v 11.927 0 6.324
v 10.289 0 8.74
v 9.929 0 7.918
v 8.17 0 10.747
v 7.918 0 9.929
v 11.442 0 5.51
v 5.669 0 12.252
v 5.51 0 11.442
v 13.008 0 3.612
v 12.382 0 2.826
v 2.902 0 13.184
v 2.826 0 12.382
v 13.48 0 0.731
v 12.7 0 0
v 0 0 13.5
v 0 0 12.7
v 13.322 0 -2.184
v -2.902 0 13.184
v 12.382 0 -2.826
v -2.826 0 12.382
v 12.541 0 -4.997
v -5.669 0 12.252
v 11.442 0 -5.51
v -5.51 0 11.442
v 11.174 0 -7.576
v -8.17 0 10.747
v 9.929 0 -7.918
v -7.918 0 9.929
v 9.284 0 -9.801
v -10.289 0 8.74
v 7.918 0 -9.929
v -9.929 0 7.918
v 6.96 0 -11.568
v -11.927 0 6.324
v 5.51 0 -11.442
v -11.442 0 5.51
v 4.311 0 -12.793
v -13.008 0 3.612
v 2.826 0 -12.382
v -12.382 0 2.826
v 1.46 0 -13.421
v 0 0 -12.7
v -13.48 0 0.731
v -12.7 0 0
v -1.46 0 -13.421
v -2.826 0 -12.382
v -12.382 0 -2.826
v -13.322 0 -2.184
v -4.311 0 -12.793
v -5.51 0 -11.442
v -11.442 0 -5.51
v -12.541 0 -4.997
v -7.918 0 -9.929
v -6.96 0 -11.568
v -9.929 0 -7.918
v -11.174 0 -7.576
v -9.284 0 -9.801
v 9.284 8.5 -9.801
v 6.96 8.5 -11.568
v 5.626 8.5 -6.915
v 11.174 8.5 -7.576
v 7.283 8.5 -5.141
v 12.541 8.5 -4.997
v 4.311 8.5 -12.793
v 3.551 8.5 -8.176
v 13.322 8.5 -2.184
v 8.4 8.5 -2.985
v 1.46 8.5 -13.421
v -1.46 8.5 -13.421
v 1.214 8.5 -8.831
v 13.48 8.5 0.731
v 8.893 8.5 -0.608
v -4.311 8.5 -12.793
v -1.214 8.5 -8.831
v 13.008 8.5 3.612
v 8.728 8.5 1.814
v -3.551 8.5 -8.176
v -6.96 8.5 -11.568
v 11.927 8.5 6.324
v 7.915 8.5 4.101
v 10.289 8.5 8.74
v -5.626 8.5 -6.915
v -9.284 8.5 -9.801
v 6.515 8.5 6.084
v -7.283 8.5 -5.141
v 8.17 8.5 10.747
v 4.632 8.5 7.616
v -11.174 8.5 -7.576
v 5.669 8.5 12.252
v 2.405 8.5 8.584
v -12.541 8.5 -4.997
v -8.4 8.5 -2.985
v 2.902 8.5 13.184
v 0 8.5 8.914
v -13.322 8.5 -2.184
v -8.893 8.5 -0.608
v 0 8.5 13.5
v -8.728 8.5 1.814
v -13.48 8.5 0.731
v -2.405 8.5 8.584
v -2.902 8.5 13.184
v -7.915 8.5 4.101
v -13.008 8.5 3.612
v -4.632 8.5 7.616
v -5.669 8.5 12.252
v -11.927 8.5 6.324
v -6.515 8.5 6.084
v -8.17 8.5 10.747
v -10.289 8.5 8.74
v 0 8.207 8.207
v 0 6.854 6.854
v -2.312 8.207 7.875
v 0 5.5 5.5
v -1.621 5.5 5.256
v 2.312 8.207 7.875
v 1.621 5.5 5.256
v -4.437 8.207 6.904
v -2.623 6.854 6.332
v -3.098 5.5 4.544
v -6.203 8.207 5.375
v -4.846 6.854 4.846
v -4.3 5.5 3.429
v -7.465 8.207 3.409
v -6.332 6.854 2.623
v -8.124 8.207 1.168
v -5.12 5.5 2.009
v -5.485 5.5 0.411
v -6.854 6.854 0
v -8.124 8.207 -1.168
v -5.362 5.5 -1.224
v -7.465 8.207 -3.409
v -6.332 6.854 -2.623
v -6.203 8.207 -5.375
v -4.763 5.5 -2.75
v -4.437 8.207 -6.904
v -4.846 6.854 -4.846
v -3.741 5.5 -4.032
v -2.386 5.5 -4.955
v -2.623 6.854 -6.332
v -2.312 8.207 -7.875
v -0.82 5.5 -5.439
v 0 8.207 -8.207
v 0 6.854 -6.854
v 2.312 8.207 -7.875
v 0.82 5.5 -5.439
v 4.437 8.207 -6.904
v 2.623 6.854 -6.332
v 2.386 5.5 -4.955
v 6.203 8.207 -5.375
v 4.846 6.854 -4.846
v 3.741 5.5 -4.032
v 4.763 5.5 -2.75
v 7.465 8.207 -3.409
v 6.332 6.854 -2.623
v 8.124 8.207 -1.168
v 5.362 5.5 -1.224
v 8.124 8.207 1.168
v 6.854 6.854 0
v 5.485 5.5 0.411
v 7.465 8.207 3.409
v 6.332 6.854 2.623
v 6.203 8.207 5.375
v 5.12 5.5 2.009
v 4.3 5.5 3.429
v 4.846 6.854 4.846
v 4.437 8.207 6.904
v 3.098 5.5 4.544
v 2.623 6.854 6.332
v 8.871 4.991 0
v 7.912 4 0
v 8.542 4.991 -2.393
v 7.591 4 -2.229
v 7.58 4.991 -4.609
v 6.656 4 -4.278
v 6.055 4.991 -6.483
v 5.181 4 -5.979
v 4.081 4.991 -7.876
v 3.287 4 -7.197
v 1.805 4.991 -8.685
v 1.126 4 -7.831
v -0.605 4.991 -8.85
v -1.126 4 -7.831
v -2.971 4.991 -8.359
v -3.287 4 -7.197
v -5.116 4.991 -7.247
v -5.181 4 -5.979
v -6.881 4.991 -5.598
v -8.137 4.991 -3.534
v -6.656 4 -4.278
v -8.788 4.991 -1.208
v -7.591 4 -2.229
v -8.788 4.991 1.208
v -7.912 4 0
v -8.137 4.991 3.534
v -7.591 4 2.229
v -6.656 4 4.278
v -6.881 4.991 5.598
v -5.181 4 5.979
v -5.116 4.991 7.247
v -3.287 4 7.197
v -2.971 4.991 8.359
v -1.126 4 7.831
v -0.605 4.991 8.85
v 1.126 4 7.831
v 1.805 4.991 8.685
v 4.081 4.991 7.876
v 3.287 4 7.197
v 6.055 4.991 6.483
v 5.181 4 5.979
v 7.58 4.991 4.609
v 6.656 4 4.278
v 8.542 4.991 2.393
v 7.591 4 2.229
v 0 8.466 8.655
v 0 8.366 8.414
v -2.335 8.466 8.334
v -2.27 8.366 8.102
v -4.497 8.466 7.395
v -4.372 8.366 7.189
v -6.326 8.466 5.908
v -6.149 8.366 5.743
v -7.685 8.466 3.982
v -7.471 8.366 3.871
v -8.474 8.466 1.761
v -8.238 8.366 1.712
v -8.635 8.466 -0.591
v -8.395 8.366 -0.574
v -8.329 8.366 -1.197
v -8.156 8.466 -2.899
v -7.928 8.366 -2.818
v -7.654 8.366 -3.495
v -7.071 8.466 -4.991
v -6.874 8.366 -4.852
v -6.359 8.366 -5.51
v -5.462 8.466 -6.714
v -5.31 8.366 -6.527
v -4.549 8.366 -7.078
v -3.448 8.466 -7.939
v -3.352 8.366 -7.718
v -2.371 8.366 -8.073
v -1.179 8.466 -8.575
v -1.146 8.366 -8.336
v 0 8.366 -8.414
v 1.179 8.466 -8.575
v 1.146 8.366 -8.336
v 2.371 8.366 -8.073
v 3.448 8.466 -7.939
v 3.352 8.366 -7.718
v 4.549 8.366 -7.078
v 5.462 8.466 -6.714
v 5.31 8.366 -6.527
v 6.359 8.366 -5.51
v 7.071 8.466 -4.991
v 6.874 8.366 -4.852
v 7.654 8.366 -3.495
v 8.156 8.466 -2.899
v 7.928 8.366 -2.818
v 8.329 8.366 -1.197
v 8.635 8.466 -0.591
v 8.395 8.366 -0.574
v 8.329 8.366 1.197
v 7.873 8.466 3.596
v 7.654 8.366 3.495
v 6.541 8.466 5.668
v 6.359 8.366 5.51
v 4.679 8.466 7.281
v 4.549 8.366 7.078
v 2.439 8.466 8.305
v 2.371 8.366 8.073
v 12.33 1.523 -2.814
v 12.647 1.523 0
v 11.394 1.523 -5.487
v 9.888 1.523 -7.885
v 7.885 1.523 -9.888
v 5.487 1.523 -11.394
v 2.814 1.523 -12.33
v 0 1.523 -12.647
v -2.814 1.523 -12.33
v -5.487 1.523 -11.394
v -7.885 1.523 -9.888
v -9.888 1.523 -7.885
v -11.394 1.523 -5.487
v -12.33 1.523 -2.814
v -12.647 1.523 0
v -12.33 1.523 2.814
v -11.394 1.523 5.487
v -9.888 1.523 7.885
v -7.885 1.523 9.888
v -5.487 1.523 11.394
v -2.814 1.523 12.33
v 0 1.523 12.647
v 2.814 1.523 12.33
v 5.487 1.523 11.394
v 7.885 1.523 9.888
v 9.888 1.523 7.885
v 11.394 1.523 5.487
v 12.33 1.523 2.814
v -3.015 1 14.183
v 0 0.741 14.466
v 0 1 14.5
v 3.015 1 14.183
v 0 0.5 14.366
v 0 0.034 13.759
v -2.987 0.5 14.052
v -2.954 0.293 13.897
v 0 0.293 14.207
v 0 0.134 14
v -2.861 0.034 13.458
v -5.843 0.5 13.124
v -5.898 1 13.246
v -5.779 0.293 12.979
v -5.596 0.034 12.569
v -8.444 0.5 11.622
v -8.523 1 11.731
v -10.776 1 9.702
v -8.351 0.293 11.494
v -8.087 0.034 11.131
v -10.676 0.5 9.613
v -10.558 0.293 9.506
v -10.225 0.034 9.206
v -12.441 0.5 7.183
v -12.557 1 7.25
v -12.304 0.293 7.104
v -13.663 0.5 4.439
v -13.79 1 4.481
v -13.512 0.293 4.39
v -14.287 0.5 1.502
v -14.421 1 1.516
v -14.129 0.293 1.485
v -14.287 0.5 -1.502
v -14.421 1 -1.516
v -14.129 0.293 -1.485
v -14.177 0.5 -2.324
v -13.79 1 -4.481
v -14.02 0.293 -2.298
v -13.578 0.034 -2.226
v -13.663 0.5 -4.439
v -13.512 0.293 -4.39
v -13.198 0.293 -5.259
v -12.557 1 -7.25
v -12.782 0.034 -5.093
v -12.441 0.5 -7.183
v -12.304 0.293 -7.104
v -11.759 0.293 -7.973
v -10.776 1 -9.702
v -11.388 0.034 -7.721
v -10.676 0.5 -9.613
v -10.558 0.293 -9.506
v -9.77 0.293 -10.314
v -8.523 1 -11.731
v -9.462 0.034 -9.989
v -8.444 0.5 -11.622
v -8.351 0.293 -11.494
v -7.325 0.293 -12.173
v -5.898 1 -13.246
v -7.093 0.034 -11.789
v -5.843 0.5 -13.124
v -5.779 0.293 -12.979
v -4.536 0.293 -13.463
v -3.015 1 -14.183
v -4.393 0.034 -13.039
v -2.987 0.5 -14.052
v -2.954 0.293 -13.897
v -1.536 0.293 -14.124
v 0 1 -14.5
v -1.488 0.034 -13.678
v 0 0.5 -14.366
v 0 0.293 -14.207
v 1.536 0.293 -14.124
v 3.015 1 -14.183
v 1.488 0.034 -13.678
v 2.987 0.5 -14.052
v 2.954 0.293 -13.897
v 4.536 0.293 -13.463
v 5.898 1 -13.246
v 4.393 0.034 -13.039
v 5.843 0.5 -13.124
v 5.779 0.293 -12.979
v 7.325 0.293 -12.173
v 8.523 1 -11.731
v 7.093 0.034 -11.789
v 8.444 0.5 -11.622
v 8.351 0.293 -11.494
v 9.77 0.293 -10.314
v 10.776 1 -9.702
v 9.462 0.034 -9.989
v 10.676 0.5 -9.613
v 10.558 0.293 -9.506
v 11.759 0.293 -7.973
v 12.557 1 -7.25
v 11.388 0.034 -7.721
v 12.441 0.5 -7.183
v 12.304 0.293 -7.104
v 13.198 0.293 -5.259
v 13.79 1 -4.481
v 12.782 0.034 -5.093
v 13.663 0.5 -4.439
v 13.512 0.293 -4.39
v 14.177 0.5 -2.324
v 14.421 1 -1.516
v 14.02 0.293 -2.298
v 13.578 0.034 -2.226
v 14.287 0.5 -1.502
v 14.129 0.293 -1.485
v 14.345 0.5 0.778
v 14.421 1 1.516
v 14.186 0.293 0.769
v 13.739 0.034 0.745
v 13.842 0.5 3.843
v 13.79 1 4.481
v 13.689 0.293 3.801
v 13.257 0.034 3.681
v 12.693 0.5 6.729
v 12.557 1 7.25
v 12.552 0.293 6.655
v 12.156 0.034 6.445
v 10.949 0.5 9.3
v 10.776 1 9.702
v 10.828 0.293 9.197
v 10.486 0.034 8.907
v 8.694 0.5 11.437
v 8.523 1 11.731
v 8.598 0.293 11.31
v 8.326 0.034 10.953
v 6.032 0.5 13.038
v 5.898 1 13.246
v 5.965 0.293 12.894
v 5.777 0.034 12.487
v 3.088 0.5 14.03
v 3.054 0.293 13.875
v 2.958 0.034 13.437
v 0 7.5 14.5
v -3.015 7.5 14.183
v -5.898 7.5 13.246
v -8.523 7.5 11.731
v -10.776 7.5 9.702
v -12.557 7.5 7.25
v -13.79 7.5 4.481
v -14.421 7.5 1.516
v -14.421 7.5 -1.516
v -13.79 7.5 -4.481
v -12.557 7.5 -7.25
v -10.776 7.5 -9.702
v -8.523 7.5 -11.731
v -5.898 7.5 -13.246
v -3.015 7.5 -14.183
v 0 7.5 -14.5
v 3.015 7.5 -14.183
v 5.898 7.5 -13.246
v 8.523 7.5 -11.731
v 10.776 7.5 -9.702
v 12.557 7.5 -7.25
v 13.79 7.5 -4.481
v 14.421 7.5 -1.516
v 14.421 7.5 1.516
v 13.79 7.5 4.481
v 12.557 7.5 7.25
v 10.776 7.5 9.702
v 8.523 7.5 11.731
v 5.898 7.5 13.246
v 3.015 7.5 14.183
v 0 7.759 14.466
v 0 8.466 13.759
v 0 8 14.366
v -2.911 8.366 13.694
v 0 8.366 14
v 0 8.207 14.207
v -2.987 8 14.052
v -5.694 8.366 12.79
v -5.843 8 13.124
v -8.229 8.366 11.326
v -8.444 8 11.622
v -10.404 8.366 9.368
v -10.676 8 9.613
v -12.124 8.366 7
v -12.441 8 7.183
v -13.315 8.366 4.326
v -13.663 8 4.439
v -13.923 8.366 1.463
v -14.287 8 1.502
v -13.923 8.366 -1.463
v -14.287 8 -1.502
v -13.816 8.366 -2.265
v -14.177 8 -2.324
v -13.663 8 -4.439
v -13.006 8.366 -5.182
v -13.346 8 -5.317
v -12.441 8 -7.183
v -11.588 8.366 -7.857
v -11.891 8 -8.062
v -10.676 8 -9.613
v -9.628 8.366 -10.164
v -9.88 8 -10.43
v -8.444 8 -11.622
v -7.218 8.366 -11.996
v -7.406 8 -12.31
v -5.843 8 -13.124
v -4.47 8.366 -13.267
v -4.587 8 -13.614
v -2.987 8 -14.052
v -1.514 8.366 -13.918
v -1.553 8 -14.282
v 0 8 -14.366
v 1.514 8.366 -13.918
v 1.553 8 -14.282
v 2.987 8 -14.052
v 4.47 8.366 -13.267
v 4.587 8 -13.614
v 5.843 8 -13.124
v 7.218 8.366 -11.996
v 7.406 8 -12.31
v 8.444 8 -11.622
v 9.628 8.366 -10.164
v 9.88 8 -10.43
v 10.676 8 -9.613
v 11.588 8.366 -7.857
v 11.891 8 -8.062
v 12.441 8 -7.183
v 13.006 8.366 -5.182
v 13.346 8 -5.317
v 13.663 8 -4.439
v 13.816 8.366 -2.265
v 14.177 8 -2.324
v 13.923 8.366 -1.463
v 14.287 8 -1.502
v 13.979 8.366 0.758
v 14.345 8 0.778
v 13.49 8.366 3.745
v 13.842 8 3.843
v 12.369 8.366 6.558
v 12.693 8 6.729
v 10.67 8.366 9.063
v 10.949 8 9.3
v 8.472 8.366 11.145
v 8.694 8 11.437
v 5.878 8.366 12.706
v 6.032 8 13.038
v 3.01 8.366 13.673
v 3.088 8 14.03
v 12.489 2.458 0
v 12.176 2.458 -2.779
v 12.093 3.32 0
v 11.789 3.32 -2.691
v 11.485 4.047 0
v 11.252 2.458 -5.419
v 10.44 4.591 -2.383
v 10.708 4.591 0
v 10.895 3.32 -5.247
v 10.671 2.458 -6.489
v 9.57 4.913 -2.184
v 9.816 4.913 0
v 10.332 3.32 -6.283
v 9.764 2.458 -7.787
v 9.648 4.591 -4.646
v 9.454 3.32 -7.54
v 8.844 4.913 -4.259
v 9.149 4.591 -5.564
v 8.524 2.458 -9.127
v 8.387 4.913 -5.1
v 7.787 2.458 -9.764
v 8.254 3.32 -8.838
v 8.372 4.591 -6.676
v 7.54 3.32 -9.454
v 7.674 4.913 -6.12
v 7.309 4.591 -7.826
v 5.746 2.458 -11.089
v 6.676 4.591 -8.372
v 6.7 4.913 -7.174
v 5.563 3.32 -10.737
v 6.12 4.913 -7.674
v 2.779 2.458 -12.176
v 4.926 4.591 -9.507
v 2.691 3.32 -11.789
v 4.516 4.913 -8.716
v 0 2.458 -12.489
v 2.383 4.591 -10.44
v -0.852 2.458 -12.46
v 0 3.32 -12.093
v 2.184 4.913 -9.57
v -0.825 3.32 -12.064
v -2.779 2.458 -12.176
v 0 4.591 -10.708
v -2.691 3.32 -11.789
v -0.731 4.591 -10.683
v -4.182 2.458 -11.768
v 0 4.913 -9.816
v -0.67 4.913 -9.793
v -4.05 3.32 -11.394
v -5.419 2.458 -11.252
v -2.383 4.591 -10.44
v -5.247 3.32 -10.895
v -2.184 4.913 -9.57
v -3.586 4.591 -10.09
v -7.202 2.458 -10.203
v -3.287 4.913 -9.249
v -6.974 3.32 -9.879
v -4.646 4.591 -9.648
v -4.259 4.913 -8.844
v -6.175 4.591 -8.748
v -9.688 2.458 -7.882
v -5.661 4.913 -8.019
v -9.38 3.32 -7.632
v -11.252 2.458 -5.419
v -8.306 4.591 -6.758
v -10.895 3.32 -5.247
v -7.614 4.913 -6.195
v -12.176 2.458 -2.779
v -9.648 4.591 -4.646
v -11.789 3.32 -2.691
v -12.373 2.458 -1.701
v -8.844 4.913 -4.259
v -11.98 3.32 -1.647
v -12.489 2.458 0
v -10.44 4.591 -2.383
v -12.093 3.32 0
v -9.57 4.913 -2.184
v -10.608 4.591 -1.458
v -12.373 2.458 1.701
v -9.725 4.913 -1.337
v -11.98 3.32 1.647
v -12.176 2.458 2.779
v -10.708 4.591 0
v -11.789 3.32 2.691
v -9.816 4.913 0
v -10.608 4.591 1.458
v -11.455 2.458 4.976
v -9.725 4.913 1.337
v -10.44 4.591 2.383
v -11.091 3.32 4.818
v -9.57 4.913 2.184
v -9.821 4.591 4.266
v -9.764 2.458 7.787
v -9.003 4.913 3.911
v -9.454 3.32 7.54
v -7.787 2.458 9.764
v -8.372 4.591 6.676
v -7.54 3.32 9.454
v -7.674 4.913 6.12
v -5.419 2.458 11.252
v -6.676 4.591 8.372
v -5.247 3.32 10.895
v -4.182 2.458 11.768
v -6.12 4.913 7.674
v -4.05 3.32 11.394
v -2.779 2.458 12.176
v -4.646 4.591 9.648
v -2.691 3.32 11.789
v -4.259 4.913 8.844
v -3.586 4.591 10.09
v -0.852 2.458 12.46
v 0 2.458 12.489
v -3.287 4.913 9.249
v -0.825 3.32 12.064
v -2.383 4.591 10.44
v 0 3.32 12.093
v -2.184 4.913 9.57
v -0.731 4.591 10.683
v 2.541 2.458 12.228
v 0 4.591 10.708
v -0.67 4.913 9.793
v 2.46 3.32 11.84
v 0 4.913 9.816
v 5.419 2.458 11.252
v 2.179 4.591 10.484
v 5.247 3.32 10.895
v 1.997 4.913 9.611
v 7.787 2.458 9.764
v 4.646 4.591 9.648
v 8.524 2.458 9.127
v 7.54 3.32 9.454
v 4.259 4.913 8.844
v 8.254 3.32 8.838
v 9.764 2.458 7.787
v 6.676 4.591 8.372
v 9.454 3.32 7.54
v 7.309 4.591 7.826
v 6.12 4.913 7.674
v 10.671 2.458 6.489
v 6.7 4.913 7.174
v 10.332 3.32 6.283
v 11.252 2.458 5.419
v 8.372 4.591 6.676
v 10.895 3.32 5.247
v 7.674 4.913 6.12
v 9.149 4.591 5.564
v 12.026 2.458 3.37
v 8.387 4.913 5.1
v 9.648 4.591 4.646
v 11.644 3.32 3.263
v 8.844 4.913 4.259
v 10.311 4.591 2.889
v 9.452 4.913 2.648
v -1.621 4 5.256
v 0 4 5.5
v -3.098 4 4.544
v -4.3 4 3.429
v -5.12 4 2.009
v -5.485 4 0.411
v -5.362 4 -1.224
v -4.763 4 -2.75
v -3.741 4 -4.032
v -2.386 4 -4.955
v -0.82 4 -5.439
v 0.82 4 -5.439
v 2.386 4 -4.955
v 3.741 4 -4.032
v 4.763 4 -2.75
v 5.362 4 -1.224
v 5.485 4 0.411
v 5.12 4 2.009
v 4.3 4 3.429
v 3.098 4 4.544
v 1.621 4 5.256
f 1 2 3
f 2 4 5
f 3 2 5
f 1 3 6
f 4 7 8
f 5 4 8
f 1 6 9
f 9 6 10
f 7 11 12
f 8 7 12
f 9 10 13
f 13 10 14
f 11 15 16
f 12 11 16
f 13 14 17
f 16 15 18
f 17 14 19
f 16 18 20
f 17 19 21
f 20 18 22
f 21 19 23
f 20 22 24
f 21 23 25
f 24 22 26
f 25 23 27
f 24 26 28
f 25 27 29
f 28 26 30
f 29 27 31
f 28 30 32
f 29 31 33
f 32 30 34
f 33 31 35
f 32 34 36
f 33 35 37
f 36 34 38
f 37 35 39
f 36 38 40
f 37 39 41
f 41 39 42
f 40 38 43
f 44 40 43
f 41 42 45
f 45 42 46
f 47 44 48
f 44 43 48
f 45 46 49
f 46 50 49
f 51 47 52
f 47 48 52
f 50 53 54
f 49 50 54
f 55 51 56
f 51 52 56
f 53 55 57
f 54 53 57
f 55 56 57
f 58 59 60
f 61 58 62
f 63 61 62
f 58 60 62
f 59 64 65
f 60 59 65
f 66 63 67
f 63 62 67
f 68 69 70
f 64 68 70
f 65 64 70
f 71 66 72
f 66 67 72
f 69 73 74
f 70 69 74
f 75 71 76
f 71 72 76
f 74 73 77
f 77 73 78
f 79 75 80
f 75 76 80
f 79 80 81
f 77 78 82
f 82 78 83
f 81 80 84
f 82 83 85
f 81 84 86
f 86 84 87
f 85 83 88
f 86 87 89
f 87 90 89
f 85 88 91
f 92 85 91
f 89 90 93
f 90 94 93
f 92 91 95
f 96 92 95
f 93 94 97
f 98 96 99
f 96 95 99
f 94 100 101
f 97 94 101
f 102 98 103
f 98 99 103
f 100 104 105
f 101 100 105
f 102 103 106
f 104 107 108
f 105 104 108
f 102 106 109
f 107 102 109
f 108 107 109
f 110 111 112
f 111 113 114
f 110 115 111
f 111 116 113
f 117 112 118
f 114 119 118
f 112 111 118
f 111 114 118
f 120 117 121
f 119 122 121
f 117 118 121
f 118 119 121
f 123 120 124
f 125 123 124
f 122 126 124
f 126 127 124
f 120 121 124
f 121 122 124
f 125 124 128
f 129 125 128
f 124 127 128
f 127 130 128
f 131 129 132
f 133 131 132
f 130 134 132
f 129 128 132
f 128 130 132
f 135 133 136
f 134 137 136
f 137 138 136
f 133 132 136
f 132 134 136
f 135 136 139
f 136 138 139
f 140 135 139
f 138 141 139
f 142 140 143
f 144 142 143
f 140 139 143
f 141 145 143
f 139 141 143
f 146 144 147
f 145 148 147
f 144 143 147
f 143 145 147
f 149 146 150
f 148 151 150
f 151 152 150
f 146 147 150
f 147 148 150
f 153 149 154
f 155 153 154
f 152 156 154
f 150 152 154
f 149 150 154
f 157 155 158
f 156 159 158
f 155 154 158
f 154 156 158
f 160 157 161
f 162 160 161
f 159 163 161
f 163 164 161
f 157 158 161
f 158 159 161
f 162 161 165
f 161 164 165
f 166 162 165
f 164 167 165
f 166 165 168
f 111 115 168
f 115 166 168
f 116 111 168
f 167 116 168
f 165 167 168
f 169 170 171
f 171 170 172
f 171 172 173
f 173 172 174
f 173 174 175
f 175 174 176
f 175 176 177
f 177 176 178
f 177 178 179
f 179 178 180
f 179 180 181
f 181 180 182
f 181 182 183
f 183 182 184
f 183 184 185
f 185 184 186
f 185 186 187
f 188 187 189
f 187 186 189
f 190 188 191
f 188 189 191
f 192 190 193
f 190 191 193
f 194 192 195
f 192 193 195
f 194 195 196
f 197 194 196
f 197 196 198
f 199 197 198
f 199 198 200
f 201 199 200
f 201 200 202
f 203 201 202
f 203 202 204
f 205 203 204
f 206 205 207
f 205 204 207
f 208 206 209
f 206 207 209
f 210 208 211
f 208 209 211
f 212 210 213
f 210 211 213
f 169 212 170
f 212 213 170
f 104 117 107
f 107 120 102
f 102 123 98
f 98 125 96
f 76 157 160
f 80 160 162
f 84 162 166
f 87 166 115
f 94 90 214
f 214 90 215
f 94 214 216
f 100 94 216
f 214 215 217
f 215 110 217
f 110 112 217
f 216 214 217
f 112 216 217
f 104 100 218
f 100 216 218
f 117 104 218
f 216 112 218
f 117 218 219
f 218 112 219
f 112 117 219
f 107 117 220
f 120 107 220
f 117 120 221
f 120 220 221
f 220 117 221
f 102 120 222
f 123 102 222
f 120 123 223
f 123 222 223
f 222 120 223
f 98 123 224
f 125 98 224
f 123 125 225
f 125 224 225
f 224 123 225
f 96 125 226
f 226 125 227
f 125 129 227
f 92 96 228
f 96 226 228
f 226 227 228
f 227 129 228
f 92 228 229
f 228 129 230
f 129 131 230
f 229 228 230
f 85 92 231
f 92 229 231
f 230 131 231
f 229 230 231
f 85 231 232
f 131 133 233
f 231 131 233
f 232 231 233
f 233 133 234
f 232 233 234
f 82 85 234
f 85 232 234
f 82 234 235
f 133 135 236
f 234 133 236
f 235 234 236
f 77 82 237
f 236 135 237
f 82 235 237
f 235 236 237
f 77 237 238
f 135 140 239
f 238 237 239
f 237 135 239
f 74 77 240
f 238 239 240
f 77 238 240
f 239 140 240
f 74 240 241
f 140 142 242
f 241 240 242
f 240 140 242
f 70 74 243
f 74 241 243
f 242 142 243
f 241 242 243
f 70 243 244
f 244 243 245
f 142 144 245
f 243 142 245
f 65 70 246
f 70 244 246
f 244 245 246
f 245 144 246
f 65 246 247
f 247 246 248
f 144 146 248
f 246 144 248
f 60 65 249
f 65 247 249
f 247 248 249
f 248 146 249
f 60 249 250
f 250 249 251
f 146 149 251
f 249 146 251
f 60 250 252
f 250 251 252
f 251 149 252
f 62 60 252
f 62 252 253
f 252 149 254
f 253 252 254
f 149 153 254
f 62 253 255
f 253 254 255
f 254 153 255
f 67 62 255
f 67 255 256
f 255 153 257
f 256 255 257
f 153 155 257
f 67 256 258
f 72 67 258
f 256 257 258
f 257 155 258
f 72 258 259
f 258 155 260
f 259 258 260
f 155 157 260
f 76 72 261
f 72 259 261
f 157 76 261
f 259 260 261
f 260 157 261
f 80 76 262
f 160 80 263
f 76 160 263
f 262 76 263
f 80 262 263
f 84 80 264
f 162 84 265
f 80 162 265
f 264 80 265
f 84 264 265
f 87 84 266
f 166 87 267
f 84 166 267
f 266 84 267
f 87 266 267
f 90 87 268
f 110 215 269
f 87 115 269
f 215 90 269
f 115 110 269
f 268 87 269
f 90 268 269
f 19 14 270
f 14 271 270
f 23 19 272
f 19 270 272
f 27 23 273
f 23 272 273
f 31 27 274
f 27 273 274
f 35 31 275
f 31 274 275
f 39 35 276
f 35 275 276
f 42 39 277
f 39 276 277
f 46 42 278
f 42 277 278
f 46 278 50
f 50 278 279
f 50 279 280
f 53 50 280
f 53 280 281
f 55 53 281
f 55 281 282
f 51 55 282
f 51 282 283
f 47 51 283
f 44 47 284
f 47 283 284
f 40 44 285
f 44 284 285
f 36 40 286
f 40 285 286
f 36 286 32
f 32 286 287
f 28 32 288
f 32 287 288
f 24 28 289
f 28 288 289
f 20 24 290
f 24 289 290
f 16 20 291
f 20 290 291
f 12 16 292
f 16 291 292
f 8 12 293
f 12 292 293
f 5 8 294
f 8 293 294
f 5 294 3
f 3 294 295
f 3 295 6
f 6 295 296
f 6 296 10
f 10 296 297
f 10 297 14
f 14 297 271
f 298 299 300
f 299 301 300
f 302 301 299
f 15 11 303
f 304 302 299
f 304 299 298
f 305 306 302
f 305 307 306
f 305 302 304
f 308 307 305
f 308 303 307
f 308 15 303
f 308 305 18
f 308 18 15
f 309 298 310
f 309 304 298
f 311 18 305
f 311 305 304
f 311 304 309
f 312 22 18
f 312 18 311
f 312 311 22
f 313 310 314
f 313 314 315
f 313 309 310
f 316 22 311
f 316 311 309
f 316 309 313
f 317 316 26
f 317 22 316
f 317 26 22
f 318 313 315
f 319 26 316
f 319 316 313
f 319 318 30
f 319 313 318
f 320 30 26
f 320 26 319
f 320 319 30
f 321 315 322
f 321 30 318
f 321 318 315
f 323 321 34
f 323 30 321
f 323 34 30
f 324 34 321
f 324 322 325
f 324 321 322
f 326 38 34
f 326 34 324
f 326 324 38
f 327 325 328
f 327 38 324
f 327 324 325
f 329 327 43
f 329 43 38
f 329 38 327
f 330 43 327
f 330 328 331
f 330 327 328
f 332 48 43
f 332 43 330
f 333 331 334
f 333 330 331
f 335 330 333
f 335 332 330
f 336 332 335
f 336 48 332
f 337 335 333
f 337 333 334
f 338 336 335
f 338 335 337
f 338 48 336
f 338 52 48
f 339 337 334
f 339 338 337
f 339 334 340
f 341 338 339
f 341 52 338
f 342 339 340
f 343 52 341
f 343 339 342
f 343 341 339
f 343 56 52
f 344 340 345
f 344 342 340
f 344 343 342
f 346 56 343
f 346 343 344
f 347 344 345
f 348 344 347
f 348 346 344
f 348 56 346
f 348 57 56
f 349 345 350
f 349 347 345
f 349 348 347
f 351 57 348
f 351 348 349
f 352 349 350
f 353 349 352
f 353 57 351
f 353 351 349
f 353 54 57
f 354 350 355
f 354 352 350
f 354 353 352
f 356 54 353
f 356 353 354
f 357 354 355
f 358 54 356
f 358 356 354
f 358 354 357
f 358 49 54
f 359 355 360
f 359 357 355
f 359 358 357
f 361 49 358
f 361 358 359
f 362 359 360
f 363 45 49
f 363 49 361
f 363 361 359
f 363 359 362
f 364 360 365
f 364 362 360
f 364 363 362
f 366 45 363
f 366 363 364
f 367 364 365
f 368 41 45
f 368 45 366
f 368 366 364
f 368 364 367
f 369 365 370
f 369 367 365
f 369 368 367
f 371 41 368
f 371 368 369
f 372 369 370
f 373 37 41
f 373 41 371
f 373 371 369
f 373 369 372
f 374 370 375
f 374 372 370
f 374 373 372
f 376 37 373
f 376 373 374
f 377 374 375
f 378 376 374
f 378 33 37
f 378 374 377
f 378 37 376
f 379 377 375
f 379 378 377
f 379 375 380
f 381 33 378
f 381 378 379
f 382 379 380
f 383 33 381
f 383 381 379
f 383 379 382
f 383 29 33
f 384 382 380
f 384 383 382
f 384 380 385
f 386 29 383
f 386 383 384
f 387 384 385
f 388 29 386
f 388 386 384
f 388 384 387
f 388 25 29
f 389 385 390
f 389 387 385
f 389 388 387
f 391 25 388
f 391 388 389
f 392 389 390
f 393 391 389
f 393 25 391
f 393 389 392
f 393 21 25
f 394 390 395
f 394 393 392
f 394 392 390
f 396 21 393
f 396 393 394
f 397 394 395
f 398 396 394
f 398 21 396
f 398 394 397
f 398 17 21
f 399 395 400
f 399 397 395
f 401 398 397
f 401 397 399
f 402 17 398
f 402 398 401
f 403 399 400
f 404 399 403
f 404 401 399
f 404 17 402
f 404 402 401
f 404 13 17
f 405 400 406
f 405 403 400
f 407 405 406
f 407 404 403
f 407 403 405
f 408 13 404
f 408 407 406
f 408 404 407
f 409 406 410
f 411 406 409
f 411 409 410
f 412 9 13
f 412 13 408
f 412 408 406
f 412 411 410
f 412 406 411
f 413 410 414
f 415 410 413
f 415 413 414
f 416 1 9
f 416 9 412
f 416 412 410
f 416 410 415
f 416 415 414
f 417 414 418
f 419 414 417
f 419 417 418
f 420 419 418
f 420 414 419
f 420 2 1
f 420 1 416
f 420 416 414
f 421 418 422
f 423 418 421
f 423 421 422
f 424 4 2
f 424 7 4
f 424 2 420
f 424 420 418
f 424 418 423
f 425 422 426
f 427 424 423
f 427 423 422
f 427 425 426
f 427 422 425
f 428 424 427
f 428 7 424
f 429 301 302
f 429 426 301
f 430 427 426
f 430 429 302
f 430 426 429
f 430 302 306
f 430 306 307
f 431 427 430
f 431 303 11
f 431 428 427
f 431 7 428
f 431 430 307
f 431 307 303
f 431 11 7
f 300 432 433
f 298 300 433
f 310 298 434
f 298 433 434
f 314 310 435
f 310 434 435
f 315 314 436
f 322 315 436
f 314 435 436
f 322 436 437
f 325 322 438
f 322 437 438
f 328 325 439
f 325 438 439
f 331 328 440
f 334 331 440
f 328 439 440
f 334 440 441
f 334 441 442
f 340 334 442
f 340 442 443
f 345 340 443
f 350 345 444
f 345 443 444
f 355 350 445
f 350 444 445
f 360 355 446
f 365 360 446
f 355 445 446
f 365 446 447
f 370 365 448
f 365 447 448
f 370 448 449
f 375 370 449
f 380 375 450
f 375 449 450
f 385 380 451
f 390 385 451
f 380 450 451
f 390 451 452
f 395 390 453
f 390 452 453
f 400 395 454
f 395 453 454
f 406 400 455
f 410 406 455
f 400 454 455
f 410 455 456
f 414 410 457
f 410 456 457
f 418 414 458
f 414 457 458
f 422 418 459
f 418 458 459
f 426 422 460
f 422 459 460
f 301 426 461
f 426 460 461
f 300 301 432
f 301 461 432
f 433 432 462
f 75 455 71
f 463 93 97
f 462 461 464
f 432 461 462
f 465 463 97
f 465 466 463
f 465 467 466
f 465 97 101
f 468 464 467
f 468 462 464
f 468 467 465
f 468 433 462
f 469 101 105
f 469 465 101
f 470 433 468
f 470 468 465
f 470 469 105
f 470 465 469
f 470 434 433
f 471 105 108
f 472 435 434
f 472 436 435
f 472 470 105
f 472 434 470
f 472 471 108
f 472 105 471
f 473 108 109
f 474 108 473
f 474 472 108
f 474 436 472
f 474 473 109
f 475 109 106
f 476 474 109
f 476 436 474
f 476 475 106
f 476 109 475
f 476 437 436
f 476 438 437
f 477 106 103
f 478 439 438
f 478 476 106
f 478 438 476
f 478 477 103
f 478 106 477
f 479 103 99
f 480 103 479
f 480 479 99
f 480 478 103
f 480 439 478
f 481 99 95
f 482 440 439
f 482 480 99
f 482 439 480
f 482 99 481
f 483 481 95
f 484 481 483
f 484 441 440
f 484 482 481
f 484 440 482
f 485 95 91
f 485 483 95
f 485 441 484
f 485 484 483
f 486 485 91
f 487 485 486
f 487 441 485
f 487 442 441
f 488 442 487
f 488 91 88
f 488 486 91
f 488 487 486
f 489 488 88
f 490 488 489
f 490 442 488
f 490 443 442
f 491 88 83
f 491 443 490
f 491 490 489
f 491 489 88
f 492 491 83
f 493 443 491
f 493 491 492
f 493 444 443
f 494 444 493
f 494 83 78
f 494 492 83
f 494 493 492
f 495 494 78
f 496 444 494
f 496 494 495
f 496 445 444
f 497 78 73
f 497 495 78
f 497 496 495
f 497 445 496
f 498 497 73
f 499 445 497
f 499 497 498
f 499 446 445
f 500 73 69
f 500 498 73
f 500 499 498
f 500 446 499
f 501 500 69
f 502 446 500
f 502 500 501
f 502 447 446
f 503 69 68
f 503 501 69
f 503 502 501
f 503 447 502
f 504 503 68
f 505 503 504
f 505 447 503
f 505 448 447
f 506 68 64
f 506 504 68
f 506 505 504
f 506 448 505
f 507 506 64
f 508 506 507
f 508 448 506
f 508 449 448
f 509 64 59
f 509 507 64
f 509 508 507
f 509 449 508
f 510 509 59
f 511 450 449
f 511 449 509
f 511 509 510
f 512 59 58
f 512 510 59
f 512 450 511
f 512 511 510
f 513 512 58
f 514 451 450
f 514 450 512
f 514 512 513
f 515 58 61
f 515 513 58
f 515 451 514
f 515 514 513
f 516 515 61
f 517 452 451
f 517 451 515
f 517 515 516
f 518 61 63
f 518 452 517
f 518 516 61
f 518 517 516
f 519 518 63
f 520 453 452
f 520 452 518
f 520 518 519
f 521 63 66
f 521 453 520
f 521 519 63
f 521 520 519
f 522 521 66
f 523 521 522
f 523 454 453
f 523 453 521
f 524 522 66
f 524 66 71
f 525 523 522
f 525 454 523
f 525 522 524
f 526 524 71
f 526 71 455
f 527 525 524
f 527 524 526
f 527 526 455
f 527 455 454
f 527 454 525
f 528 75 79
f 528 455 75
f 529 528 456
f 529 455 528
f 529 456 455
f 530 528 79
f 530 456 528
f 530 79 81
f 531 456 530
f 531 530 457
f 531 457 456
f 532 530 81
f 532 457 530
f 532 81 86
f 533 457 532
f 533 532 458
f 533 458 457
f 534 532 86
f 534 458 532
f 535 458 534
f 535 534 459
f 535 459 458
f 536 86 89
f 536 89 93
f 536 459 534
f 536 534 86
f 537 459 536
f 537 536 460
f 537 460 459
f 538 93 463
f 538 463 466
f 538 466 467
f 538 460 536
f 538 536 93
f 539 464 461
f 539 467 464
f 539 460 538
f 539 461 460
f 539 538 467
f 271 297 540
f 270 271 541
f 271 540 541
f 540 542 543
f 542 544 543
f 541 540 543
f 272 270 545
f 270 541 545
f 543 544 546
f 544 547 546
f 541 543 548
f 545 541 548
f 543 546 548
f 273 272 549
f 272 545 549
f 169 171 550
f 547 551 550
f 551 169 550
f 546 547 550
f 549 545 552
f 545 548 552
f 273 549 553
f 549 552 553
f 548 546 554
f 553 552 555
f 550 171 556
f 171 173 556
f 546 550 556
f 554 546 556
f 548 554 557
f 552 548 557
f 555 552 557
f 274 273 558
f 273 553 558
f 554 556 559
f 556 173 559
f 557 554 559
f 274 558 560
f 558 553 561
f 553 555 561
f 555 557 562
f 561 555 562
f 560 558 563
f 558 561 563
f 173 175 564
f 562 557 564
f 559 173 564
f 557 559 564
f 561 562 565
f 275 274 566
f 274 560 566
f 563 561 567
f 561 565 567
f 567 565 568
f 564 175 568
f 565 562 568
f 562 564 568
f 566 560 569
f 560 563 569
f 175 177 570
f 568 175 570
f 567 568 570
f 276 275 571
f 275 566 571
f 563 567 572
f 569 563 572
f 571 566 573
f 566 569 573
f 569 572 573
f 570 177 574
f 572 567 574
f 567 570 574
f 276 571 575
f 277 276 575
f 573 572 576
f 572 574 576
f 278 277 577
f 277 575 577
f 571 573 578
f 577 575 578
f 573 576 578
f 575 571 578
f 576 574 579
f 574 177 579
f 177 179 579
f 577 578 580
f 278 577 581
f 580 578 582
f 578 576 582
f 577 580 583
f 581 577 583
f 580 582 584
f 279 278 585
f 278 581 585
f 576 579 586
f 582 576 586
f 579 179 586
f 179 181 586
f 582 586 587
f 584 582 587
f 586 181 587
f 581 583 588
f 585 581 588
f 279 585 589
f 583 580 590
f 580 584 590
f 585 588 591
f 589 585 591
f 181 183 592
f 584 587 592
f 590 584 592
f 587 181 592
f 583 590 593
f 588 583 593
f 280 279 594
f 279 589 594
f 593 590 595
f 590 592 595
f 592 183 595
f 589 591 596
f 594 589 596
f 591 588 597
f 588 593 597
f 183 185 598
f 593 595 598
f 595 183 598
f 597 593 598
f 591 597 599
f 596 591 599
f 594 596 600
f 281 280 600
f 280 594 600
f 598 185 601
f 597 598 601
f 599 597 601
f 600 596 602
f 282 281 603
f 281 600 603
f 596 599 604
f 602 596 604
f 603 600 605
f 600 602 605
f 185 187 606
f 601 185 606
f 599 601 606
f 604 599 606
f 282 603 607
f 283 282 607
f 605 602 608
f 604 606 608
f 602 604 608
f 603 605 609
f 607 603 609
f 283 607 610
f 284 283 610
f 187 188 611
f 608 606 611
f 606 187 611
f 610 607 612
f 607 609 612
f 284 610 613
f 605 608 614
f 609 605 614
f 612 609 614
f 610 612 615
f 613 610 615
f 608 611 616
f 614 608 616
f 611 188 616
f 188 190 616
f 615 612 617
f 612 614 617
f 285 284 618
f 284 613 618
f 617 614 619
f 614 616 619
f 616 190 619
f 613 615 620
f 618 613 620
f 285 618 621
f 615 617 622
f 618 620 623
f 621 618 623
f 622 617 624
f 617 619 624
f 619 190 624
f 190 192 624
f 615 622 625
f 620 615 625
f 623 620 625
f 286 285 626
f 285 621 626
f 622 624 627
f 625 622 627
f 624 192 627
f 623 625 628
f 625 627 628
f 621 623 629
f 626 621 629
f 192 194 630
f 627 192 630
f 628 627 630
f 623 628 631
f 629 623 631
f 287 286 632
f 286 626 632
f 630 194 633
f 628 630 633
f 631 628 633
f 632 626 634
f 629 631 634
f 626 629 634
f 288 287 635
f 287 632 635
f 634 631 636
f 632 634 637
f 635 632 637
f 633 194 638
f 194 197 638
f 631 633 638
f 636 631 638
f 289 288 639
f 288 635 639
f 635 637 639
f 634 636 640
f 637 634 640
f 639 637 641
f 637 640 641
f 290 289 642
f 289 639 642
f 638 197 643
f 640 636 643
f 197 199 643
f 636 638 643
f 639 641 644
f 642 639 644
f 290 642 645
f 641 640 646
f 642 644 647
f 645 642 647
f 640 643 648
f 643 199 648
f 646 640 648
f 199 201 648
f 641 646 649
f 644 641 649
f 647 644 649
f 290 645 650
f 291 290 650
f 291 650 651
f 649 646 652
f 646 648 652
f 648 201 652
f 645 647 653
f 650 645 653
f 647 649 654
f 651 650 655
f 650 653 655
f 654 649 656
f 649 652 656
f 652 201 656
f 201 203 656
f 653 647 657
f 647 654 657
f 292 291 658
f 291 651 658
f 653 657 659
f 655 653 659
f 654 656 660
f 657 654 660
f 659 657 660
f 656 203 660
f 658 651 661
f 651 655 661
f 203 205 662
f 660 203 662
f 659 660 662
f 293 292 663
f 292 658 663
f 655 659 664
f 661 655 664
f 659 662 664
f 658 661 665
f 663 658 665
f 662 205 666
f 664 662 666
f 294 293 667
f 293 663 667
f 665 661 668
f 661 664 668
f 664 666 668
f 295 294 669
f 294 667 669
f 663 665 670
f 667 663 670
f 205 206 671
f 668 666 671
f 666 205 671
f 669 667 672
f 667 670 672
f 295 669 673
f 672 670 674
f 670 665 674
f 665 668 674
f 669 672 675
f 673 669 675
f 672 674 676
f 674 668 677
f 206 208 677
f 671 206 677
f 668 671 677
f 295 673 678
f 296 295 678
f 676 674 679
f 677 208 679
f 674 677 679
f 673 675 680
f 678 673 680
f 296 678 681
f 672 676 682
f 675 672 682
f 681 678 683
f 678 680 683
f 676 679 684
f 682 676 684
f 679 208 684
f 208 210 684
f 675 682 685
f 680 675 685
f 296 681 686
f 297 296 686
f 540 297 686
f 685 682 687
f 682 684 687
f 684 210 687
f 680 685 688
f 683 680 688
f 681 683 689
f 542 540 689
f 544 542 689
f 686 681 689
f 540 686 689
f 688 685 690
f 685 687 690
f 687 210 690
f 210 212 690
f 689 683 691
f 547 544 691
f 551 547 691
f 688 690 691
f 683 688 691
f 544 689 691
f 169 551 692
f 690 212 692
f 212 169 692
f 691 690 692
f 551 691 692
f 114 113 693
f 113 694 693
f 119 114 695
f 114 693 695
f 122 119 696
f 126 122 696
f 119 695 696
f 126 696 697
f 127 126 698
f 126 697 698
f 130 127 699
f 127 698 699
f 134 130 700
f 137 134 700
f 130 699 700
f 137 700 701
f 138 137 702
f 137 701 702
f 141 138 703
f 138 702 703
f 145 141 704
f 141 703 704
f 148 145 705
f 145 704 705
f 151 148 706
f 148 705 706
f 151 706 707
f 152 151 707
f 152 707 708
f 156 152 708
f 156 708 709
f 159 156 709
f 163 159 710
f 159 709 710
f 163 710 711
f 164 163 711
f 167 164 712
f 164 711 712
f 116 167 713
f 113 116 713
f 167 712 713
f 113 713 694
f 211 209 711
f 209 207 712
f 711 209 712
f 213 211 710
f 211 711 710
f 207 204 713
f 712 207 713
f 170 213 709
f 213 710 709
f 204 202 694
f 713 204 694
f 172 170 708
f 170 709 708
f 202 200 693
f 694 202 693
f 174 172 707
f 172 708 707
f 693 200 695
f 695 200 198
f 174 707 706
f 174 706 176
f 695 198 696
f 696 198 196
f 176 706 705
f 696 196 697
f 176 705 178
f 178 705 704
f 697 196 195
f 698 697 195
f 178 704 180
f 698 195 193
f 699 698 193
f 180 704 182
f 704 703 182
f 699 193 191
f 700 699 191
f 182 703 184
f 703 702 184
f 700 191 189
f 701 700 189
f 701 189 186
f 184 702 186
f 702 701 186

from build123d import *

# Parameters (mm, degrees)
FILLET1_R = 1


# Read off the part's stored shape, not the designer's step: Dog Bowl Washer
with BuildPart() as part:
    # Dog Bowl Washer outline → Dog Bowl Washer (revolve)
    with BuildSketch(Plane.XY):
        with BuildLine():
            Line((5.2705, 1.27), (6.392427617, 0))
            Line((6.392427617, 0), (12.7, 0))
            Line((12.7, 0), (12.646813167, 1.52307162))
            ThreePointArc((12.646813167, 1.52307162), (11.484828724, 4.047470654), (8.87095, 4.9911))
            Line((8.87095, 4.9911), (5.2705, 1.27))
        make_face()
    revolve(axis=Axis((0, 0, 0), (0, 1, 0)))


with BuildPart() as body_2:
    # Sketch1 → Revolve1 (revolve)
    with BuildSketch(Plane.XY, mode=Mode.PRIVATE) as revolve1_sk:
        Polygon((-14.5, 8.5), (-8.5, 8.5), (-5.5, 5.5), (-5.5, 4), (-8.5, 4), (-8.5, 0), (-14.5, 0), align=None)
    revolve(revolve1_sk.sketch.rotate(Axis((0, 10.834647468, 0), (0, -1, 0)), 270), axis=Axis((0, 10.834647468, 0), (0, -1, 0)))

    # Combine1: cut part
    add(part.part, mode=Mode.SUBTRACT)

    # Fillet1
    fillet1_edges = [body_2.edges().sort_by_distance(p)[0] for p in [
        (0, 0, -14.5),
        (0, 8.5, -8.5),
        (0, 8.5, -14.5),
    ]]
    fillet(fillet1_edges, radius=FILLET1_R)


solid = body_2.part
